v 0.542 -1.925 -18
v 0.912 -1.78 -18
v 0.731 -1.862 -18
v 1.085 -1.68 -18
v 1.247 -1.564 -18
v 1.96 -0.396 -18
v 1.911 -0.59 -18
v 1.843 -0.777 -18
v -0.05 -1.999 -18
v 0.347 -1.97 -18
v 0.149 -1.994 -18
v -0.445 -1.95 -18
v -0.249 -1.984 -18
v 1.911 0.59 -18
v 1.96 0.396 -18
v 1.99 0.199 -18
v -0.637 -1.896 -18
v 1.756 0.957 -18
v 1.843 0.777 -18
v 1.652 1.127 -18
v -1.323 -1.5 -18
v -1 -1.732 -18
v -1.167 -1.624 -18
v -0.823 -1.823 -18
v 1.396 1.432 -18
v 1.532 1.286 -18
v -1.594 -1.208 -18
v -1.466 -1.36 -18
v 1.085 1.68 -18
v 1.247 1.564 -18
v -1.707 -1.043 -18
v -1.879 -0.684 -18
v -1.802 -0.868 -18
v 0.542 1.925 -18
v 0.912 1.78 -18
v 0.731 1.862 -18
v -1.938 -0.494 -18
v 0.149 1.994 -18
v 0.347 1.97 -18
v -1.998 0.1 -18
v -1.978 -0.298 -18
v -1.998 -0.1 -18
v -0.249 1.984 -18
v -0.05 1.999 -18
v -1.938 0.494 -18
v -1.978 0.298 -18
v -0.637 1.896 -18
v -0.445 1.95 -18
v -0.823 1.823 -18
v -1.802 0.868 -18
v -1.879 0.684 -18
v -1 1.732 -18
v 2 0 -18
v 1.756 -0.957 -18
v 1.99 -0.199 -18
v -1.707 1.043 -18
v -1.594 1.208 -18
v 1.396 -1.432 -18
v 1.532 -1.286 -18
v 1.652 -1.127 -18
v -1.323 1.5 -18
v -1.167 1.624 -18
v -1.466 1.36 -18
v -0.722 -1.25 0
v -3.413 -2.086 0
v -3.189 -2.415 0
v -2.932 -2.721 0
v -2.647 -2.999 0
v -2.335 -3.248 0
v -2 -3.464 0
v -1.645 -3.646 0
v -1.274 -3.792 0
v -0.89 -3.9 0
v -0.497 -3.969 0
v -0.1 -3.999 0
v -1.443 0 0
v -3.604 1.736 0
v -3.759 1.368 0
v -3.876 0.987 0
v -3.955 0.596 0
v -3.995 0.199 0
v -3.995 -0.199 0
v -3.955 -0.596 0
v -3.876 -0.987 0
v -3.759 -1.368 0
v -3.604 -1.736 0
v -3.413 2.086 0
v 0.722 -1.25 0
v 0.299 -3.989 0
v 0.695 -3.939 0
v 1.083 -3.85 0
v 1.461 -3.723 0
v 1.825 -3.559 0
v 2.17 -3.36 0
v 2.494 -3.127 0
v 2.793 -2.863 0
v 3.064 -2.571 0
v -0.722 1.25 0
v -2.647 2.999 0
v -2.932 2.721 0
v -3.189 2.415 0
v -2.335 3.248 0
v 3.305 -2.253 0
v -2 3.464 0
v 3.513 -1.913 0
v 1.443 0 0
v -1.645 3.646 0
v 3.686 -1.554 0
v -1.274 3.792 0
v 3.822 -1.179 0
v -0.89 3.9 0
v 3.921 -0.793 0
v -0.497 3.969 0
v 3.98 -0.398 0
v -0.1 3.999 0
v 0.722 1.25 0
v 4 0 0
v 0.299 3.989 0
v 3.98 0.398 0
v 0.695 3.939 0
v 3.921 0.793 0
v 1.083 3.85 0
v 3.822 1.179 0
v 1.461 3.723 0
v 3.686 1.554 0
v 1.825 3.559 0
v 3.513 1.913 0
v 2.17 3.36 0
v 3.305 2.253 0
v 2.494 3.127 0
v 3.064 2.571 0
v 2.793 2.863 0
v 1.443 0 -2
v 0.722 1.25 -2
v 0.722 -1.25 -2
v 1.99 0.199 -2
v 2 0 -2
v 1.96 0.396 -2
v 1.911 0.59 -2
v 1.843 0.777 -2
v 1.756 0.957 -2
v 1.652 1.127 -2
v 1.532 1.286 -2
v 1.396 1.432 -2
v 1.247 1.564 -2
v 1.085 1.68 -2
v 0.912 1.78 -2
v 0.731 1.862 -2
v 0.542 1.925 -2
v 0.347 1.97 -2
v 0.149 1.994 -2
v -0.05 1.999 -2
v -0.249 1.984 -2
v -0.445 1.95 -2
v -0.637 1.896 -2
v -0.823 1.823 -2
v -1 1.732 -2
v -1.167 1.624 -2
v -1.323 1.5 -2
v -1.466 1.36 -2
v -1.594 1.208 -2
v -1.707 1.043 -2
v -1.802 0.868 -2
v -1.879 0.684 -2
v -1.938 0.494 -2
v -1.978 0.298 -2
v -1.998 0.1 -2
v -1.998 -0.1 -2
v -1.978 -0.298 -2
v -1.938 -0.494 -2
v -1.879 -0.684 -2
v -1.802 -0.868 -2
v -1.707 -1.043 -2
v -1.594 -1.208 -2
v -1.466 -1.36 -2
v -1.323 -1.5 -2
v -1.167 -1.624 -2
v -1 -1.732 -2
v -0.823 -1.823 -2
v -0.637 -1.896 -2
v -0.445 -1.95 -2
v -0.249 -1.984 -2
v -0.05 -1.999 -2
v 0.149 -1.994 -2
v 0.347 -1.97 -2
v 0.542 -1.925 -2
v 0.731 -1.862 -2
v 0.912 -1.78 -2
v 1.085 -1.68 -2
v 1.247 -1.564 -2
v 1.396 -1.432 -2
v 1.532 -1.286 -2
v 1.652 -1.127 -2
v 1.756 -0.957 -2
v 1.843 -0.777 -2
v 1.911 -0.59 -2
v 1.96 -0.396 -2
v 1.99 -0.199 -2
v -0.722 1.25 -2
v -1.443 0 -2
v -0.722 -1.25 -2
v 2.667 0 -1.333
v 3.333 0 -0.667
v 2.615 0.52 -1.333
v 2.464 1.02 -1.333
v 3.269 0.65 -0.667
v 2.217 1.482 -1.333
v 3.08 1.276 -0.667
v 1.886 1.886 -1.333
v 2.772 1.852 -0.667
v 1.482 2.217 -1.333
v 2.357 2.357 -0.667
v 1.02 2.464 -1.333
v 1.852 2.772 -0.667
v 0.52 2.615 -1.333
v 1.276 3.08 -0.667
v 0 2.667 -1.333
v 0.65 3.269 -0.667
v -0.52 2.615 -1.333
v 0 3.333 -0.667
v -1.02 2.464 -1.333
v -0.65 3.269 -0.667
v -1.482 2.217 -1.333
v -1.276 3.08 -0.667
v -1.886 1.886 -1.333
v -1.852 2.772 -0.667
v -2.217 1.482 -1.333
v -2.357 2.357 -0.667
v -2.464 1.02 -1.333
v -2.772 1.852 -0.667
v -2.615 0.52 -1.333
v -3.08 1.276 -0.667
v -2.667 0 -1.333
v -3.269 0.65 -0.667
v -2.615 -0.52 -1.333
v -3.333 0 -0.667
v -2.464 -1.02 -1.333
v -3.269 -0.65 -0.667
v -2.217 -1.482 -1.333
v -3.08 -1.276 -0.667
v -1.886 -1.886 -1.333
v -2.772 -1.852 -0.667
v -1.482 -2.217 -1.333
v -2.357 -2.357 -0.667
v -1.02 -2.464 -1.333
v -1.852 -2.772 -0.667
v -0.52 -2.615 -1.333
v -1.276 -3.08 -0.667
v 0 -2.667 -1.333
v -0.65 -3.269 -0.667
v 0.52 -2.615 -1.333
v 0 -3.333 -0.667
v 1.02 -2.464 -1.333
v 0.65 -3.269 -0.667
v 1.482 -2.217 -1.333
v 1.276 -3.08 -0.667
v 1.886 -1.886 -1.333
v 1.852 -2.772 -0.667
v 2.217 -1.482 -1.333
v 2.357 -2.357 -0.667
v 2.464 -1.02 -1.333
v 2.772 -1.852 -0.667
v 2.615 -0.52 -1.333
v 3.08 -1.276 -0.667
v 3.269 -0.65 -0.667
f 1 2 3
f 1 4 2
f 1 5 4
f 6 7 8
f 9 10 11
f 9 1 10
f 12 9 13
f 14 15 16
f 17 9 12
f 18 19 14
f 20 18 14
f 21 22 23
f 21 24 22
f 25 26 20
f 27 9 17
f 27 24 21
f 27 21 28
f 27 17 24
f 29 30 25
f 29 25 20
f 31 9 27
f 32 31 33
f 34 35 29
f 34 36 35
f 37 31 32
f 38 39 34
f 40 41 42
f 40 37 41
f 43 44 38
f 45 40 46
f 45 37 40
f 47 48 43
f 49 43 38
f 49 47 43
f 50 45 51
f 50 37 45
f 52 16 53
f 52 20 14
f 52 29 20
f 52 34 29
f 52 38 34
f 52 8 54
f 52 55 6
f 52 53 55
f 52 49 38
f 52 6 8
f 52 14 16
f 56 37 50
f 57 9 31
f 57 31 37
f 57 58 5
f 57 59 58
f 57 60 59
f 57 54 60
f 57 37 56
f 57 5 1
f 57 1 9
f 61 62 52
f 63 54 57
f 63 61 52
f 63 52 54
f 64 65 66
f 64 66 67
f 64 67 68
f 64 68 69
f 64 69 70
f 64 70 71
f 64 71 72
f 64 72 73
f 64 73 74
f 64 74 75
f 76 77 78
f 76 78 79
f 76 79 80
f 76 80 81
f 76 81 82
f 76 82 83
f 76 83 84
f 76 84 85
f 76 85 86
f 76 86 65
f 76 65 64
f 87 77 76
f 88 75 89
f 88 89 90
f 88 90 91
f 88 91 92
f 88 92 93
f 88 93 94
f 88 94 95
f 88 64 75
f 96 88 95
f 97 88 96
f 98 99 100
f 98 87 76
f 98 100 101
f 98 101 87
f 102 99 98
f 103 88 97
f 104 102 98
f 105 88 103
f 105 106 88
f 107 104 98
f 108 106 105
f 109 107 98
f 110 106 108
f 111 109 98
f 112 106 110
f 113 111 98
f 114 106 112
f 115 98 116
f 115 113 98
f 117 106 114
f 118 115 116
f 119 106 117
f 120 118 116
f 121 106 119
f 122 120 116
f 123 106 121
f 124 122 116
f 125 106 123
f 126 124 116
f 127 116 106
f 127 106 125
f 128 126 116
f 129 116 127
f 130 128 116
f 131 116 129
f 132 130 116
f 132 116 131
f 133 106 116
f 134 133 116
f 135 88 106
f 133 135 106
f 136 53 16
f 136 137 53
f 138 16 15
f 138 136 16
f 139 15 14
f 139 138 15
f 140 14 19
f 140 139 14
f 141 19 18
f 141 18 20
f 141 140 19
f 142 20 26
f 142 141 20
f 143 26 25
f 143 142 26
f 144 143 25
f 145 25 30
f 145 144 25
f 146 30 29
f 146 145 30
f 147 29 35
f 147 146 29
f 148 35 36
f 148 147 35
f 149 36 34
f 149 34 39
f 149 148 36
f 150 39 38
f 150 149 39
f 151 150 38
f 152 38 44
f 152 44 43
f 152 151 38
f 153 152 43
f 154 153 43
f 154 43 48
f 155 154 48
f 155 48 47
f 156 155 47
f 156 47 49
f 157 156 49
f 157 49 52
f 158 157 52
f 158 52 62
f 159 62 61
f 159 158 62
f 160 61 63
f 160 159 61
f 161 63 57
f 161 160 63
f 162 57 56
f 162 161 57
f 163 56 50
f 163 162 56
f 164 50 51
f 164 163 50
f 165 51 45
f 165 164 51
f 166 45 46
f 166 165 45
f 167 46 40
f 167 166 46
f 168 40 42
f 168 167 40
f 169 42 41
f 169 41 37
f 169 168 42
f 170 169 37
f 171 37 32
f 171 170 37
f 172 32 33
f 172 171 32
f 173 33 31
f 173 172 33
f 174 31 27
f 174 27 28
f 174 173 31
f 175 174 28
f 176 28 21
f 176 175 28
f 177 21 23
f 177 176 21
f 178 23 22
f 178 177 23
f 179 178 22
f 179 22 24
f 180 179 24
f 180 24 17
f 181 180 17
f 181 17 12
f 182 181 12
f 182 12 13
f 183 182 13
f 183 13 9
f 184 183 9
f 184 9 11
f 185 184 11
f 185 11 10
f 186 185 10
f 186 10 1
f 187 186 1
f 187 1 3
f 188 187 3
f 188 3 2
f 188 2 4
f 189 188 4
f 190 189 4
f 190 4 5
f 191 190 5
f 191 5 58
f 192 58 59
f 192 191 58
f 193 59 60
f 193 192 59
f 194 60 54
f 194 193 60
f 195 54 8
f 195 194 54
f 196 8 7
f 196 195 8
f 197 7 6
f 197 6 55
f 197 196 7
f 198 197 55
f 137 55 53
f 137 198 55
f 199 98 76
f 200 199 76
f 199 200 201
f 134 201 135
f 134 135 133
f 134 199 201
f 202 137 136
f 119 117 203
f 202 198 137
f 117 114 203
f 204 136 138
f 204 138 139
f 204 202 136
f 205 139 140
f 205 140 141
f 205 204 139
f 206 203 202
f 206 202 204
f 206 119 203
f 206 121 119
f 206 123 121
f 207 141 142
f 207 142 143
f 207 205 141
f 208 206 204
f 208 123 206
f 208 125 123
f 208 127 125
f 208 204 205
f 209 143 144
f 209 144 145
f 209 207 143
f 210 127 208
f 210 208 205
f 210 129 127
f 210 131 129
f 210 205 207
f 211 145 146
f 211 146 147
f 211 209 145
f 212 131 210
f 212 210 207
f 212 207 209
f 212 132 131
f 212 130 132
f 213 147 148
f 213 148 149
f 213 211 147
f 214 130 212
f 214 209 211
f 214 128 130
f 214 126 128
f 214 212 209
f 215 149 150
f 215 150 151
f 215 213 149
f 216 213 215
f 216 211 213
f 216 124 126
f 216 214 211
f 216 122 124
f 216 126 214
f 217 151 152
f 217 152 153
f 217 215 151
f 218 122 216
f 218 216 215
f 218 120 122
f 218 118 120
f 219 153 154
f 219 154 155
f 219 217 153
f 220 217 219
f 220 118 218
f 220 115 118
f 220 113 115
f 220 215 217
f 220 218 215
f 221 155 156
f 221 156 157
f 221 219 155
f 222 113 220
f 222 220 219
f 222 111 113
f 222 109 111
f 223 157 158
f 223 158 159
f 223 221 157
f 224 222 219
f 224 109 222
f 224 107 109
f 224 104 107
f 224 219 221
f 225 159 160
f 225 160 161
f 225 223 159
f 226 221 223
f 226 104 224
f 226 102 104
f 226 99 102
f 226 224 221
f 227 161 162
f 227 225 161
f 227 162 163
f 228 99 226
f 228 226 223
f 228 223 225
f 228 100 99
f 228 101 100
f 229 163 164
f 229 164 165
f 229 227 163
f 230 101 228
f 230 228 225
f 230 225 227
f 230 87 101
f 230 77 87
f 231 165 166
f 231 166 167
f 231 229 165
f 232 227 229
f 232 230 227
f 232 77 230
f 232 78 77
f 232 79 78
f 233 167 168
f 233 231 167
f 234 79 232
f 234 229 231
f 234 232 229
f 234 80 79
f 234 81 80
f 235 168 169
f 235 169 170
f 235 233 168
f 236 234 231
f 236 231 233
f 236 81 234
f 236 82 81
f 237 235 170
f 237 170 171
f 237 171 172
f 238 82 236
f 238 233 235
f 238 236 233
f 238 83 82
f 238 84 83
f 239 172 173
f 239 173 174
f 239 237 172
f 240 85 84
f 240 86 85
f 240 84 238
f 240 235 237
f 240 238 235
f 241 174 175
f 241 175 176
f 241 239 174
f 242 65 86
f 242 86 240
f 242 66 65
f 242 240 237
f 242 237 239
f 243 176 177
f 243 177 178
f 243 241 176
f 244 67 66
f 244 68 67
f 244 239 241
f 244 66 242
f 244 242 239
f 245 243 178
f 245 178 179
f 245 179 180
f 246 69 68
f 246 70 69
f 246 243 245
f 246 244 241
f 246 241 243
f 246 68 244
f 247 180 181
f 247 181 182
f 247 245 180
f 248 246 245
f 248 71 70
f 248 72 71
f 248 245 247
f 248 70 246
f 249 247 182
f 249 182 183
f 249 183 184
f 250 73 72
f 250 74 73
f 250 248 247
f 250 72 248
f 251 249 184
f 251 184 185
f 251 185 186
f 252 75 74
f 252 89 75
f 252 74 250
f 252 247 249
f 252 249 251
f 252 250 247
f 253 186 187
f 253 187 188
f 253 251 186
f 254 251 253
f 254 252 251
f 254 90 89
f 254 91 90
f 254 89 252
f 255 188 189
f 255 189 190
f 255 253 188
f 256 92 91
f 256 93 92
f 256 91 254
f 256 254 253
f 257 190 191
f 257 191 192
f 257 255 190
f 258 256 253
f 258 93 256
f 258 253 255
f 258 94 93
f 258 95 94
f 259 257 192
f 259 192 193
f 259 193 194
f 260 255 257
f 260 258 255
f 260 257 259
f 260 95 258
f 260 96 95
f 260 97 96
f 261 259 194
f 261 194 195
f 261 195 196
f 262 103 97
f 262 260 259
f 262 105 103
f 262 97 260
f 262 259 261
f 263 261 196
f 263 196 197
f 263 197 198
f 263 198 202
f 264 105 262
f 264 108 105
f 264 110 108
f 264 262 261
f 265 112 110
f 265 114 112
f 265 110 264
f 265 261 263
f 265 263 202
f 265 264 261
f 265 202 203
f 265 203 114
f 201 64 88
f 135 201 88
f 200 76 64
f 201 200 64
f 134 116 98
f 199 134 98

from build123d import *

# Parameters (mm, degrees)
F3_DEPTH = 2


with BuildPart() as f1:
    # F0 (on Front) → F1 (revolve)
    with BuildSketch(Plane.XZ):
        Polygon((4, 0), (0, 0), (0, -18), (2, -18), (2, -2), align=None)
    revolve(axis=Axis((0, 0, -9), (0, 0, 1)))

    # F2 (on face) → F3 (cut)
    with BuildSketch(Plane.XY):
        Polygon((0.721688, 1.25), (-0.721688, 1.25), (-1.443376, 0), (-0.721688, -1.25), (0.721688, -1.25), (1.443376, 0), align=None)
    extrude(amount=-F3_DEPTH, mode=Mode.SUBTRACT)


solid = f1.part
